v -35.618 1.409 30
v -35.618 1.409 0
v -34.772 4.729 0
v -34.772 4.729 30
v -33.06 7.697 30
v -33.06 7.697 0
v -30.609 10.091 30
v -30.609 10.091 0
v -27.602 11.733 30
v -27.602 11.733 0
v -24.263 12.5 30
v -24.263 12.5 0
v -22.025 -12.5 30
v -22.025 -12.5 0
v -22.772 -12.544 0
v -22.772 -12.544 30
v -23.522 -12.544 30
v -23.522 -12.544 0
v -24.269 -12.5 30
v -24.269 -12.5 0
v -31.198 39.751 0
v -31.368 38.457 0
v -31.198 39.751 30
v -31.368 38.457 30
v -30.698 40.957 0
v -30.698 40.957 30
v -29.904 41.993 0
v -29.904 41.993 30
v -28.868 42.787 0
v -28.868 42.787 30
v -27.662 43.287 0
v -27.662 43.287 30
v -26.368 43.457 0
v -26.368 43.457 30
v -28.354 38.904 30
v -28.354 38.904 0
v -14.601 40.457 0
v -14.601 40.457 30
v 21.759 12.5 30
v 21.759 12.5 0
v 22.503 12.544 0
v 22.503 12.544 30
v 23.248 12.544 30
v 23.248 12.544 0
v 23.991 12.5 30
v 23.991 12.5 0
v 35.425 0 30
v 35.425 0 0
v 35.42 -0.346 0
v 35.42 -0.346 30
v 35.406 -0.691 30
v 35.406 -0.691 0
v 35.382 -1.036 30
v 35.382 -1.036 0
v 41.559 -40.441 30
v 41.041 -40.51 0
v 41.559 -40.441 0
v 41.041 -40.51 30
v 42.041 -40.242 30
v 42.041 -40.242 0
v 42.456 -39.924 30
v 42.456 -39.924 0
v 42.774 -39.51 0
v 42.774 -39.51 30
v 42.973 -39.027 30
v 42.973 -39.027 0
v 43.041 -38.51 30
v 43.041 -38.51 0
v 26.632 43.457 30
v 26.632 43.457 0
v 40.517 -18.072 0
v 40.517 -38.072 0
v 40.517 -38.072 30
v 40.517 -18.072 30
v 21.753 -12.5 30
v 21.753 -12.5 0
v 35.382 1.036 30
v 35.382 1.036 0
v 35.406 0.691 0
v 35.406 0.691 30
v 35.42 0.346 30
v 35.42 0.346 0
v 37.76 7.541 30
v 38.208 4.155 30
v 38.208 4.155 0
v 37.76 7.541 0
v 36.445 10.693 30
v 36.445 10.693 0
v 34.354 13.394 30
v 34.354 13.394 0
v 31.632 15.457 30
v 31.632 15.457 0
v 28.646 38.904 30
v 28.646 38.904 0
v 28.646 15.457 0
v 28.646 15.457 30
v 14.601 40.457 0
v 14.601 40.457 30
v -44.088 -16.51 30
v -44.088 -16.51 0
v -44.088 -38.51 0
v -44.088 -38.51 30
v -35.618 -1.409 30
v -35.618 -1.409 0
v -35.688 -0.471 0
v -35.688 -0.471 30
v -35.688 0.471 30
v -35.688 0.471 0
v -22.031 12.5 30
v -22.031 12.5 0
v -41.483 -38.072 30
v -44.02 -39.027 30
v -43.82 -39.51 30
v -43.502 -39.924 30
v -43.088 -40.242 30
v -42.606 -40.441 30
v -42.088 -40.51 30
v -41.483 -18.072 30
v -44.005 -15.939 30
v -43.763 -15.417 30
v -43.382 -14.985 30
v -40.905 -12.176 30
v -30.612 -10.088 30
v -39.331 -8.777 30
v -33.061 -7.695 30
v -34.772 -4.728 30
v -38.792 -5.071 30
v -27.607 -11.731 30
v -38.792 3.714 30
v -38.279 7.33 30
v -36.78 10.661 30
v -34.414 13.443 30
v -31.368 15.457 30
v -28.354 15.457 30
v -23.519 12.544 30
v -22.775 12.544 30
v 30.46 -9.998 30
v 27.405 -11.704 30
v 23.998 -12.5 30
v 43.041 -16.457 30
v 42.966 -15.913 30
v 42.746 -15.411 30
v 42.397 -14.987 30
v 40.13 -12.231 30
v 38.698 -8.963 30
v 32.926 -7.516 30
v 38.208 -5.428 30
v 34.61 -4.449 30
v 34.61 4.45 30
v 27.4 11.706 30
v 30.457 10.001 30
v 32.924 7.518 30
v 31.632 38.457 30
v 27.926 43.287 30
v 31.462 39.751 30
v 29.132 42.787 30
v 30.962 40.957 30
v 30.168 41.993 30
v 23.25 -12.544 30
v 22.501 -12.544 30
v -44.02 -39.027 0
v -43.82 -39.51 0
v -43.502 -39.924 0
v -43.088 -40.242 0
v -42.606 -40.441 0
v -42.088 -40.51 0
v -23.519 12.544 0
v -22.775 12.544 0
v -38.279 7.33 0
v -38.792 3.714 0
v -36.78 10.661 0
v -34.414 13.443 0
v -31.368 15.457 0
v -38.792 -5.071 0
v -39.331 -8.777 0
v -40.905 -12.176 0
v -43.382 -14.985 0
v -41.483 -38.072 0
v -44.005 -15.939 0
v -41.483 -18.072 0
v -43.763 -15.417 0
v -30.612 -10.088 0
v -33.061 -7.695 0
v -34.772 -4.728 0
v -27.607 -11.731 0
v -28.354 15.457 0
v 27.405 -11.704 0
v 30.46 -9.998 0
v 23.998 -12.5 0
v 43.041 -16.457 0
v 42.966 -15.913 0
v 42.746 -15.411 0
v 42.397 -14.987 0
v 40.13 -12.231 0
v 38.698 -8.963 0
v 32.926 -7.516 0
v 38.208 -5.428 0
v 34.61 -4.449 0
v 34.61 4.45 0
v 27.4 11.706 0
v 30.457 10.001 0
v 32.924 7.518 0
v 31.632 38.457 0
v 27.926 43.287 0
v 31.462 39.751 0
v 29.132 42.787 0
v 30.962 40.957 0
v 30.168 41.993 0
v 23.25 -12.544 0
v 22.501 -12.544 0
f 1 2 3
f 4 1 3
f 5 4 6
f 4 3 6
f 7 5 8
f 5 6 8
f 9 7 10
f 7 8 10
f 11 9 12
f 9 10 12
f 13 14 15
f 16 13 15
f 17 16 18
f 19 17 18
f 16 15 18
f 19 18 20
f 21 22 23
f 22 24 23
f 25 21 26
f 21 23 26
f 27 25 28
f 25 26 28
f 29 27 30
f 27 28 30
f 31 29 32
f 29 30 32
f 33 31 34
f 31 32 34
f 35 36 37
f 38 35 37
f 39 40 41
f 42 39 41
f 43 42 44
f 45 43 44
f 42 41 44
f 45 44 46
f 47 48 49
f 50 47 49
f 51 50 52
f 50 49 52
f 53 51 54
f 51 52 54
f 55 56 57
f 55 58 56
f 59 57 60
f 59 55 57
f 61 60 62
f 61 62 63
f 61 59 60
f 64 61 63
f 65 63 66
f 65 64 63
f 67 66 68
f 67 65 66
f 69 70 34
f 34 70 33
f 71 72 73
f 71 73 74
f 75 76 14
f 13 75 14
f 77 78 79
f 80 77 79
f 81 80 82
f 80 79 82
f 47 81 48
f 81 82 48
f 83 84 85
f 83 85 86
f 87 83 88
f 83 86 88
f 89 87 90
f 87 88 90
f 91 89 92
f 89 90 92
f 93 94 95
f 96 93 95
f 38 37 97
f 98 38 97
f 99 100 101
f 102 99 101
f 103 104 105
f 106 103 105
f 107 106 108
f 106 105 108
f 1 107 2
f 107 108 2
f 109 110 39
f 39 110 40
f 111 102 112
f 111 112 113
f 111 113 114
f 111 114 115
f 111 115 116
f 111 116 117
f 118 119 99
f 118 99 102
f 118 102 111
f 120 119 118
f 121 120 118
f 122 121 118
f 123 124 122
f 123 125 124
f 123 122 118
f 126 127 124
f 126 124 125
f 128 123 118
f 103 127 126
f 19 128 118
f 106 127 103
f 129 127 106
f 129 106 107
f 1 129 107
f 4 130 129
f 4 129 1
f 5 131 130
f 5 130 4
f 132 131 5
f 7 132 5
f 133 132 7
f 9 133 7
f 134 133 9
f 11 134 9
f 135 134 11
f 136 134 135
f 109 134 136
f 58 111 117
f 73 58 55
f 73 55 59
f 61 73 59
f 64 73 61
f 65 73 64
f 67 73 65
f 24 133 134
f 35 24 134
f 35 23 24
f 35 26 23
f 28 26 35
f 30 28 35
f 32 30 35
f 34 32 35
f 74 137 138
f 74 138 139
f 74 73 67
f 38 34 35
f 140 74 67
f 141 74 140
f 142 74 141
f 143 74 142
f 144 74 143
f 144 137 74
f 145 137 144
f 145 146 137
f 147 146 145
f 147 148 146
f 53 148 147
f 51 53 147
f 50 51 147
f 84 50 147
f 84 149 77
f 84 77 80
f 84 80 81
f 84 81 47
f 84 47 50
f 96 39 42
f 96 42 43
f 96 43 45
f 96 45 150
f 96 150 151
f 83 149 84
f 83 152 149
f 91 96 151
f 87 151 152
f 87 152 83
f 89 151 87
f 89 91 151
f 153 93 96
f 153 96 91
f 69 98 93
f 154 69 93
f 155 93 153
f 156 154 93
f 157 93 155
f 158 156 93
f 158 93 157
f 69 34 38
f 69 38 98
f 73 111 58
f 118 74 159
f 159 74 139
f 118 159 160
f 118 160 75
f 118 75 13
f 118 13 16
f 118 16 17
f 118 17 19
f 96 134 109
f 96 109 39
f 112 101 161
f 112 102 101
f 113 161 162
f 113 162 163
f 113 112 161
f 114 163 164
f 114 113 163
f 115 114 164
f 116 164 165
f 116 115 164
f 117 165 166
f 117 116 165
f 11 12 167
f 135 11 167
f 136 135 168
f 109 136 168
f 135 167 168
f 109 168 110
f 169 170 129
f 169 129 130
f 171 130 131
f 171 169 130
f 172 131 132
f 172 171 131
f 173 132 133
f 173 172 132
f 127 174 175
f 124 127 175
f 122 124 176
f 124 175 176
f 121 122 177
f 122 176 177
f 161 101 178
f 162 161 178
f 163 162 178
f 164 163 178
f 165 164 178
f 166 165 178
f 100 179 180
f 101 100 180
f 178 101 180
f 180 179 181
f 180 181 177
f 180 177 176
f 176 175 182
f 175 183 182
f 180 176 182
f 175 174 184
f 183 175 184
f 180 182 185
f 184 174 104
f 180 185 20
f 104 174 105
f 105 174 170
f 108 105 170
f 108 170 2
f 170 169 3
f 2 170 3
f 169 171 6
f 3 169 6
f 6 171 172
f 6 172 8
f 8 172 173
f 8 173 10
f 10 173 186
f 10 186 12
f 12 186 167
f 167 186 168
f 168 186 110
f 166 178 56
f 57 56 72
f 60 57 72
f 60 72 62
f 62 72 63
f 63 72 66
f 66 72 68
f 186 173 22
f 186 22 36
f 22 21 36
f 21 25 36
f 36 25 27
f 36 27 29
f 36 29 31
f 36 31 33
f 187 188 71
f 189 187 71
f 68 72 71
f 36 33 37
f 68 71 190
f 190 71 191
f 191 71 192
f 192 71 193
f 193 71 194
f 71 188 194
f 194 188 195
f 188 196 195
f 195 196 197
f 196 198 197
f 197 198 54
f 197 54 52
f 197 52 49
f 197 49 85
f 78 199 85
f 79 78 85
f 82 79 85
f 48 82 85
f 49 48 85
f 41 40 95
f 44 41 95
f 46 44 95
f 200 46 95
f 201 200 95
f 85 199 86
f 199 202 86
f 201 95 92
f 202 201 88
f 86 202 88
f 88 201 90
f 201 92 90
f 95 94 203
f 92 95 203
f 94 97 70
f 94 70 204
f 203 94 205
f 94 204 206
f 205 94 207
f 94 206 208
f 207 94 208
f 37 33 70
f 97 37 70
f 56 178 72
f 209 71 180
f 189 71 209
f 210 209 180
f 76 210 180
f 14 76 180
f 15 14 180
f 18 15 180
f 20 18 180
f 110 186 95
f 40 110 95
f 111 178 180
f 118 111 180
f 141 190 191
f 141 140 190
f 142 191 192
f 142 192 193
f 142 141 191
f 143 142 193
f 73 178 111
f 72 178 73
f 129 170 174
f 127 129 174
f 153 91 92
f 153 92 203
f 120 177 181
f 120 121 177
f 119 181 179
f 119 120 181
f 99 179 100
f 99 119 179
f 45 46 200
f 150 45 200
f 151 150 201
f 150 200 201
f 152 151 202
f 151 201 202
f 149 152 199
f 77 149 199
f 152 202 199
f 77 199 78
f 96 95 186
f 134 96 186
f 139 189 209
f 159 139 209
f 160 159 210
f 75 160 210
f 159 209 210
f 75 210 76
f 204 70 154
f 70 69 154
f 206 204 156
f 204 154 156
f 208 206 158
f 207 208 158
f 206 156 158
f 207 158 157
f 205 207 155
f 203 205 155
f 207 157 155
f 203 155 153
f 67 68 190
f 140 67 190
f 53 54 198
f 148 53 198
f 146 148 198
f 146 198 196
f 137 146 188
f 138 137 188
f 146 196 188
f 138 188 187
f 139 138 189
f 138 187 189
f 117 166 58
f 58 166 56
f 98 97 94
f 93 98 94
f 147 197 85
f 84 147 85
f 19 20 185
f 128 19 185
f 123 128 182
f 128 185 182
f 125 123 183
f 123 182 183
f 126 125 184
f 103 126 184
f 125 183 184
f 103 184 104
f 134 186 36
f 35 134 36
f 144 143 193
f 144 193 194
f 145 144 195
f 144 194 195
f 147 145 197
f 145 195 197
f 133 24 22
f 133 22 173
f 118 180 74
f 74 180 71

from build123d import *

# Parameters (mm, degrees)
F0_W        = 82
F0_H        = 20
F1_DEPTH    = 30
F2_T1_DEPTH = 30
F2_T3_DEPTH = 88.7163597955
F2_T5_DEPTH = 86.5103060247
F3_R        = 5
F4_R        = 2


# Not quite as in the source:
# - a fillet or chamfer that OpenCascade refuses, or shapes differently, is made with other operations: its cross-section is extruded or revolved along the edge and cut away or added


with BuildPart() as f1:
    # F0 (on Top) → F1 (new body)
    with BuildSketch(Plane.XY):
        Polygon((-31.3680246472, 15.4572909642), (-38.791685015, 15.4572909642), (-38.791685015, -15.5427090358), (38.208314985, -15.5427090358), (38.208314985, 15.4572909642), (31.6319753528, 15.4572909642), (28.6463200748, 15.4572909642), (-28.3536799252, 15.4572909642), align=None)
        with BuildLine():
            Line((-35.617634356, 1.409011777), (-35.617634356, 12.5002924819))
            Line((-35.617634356, 12.5002924819), (-24.2628612362, 12.5002924819))
            ThreePointArc((-24.2628612362, 12.5002924819), (-23.1469813734, 12.55), (-22.0311015107, 12.5002924819))
            Line((-22.0311015107, 12.5002924819), (21.7593006052, 12.5002924819))
            ThreePointArc((21.7593006052, 12.5002924819), (22.875180468, 12.55), (23.9910603307, 12.5002924819))
            Line((23.9910603307, 12.5002924819), (35.382365644, 12.5002924819))
            Line((35.382365644, 12.5002924819), (35.382365644, 1.035769749))
            ThreePointArc((35.382365644, 1.035769749), (35.4144721936, 0.5183271366), (35.425180468, 0))
            ThreePointArc((35.425180468, 0), (35.4144721936, -0.5183271366), (35.382365644, -1.035769749))
            Line((35.382365644, -1.035769749), (35.382365644, -12.4997075181))
            Line((35.382365644, -12.4997075181), (23.9975939216, -12.4997075181))
            ThreePointArc((23.9975939216, -12.4997075181), (22.875180468, -12.55), (21.7527670144, -12.4997075181))
            Line((21.7527670144, -12.4997075181), (-22.0245679198, -12.4997075181))
            ThreePointArc((-22.0245679198, -12.4997075181), (-23.1469813734, -12.55), (-24.269394827, -12.4997075181))
            Line((-24.269394827, -12.4997075181), (-35.617634356, -12.4997075181))
            Line((-35.617634356, -12.4997075181), (-35.617634356, -1.409011777))
            ThreePointArc((-35.617634356, -1.409011777), (-35.6969813734, 0), (-35.617634356, 1.409011777))
        make_face(mode=Mode.SUBTRACT)
        Polygon((38.208314985, -15.5427090358), (-38.791685015, -15.5427090358), (-44.0882174298, -15.5427090358), (-44.0882174298, -40.5095070601), (43.0414974689, -40.5095070601), (43.0414974689, -15.5427090358), align=None)
        with Locations((-0.4833955318, -28.0716251582)):
            Rectangle(F0_W, F0_H, mode=Mode.SUBTRACT)
        Polygon((-31.3680246472, 43.4572909642), (-31.3680246472, 15.4572909642), (-28.3536799252, 15.4572909642), (-28.3536799252, 38.9038845897), (-28.3536799252, 40.4572909642), (-14.6007314324, 40.4572909642), (14.6007314324, 40.4572909642), (28.6463200748, 40.4572909642), (28.6463200748, 38.9038845897), (28.6463200748, 15.4572909642), (31.6319753528, 15.4572909642), (31.6319753528, 43.4572909642), align=None)
        with BuildLine():
            Line((35.382365644, 12.5002924819), (23.9910603307, 12.5002924819))
            ThreePointArc((23.9910603307, 12.5002924819), (31.7777528847, 8.8457167242), (35.382365644, 1.035769749))
            Line((35.382365644, 1.035769749), (35.382365644, 12.5002924819))
        make_face()
        with BuildLine():
            ThreePointArc((35.382365644, -1.035769749), (31.7800643524, -8.8433897915), (23.9975939216, -12.4997075181))
            Line((23.9975939216, -12.4997075181), (35.382365644, -12.4997075181))
            Line((35.382365644, -12.4997075181), (35.382365644, -1.035769749))
        make_face()
        with BuildLine():
            Line((-24.2628612362, 12.5002924819), (-35.617634356, 12.5002924819))
            Line((-35.617634356, 12.5002924819), (-35.617634356, 1.409011777))
            ThreePointArc((-35.617634356, 1.409011777), (-31.9163938742, 8.9777449503), (-24.2628612362, 12.5002924819))
        make_face()
        with BuildLine():
            ThreePointArc((-24.269394827, -12.4997075181), (-31.9187398511, -8.9754528136), (-35.617634356, -1.409011777))
            Line((-35.617634356, -1.409011777), (-35.617634356, -12.4997075181))
            Line((-35.617634356, -12.4997075181), (-24.269394827, -12.4997075181))
        make_face()
        Polygon((14.6007314324, 40.4572909642), (28.6463200748, 38.9038845897), (28.6463200748, 40.4572909642), align=None)
        Polygon((-28.3536799252, 40.4572909642), (-28.3536799252, 38.9038845897), (-14.6007314324, 40.4572909642), align=None)
    extrude(amount=F1_DEPTH)

    # F2: fillet of radius 13 on 4 edges, made by hand

    # F2_s2 → F2_t1 (join)
    with BuildSketch(Plane.XY):
        with BuildLine():
            ThreePointArc((-38.791685015, -5.0710049164), (-40.1911445403, -10.9384967738), (-44.0882174298, -15.5427090358))
            Line((-44.0882174298, -15.5427090358), (-38.791685015, -15.5427090358))
            Line((-38.791685015, -15.5427090358), (-38.791685015, -5.0710049164))
        make_face()
        with BuildLine():
            ThreePointArc((43.0414974689, -15.5427090358), (39.4786809816, -11.0331797269), (38.208314985, -5.4282099548))
            Line((38.208314985, -5.4282099548), (38.208314985, -15.5427090358))
            Line((38.208314985, -15.5427090358), (43.0414974689, -15.5427090358))
        make_face()
    extrude(amount=F2_T1_DEPTH)

    # F2_s4 → F2_t3 (cut)
    with BuildSketch(Plane.XY.offset(-29.3581798978)):
        with BuildLine():
            ThreePointArc((-38.791685015, 3.7140190051), (-36.7801429418, 10.6605139767), (-31.3680246472, 15.4572909642))
            Line((-31.3680246472, 15.4572909642), (-38.791685015, 15.4572909642))
            Line((-38.791685015, 15.4572909642), (-38.791685015, 3.7140190051))
        make_face()
    extrude(amount=F2_T3_DEPTH, mode=Mode.SUBTRACT)

    # F2_s6 → F2_t5 (cut)
    with BuildSketch(Plane.XY.offset(-28.2551530123)):
        with BuildLine():
            ThreePointArc((38.208314985, 4.1552297593), (36.44458627, 10.6932881568), (31.6319753528, 15.4572909642))
            Line((31.6319753528, 15.4572909642), (38.208314985, 15.4572909642))
            Line((38.208314985, 15.4572909642), (38.208314985, 4.1552297593))
        make_face()
    extrude(amount=F2_T5_DEPTH, mode=Mode.SUBTRACT)

    # F3
    f3_edges = [f1.edges().sort_by_distance(p)[0] for p in [
        (31.631975, 43.457291, 15),
        (-31.368025, 43.457291, 15),
    ]]
    fillet(f3_edges, radius=F3_R)

    # F4
    f4_edges = [f1.edges().sort_by_distance(p)[0] for p in [
        (-44.088217, -15.542709, 15),
        (-44.088217, -40.509507, 15),
        (43.041497, -40.509507, 15),
        (43.041497, -15.542709, 15),
    ]]
    fillet(f4_edges, radius=F4_R)


solid = f1.part
